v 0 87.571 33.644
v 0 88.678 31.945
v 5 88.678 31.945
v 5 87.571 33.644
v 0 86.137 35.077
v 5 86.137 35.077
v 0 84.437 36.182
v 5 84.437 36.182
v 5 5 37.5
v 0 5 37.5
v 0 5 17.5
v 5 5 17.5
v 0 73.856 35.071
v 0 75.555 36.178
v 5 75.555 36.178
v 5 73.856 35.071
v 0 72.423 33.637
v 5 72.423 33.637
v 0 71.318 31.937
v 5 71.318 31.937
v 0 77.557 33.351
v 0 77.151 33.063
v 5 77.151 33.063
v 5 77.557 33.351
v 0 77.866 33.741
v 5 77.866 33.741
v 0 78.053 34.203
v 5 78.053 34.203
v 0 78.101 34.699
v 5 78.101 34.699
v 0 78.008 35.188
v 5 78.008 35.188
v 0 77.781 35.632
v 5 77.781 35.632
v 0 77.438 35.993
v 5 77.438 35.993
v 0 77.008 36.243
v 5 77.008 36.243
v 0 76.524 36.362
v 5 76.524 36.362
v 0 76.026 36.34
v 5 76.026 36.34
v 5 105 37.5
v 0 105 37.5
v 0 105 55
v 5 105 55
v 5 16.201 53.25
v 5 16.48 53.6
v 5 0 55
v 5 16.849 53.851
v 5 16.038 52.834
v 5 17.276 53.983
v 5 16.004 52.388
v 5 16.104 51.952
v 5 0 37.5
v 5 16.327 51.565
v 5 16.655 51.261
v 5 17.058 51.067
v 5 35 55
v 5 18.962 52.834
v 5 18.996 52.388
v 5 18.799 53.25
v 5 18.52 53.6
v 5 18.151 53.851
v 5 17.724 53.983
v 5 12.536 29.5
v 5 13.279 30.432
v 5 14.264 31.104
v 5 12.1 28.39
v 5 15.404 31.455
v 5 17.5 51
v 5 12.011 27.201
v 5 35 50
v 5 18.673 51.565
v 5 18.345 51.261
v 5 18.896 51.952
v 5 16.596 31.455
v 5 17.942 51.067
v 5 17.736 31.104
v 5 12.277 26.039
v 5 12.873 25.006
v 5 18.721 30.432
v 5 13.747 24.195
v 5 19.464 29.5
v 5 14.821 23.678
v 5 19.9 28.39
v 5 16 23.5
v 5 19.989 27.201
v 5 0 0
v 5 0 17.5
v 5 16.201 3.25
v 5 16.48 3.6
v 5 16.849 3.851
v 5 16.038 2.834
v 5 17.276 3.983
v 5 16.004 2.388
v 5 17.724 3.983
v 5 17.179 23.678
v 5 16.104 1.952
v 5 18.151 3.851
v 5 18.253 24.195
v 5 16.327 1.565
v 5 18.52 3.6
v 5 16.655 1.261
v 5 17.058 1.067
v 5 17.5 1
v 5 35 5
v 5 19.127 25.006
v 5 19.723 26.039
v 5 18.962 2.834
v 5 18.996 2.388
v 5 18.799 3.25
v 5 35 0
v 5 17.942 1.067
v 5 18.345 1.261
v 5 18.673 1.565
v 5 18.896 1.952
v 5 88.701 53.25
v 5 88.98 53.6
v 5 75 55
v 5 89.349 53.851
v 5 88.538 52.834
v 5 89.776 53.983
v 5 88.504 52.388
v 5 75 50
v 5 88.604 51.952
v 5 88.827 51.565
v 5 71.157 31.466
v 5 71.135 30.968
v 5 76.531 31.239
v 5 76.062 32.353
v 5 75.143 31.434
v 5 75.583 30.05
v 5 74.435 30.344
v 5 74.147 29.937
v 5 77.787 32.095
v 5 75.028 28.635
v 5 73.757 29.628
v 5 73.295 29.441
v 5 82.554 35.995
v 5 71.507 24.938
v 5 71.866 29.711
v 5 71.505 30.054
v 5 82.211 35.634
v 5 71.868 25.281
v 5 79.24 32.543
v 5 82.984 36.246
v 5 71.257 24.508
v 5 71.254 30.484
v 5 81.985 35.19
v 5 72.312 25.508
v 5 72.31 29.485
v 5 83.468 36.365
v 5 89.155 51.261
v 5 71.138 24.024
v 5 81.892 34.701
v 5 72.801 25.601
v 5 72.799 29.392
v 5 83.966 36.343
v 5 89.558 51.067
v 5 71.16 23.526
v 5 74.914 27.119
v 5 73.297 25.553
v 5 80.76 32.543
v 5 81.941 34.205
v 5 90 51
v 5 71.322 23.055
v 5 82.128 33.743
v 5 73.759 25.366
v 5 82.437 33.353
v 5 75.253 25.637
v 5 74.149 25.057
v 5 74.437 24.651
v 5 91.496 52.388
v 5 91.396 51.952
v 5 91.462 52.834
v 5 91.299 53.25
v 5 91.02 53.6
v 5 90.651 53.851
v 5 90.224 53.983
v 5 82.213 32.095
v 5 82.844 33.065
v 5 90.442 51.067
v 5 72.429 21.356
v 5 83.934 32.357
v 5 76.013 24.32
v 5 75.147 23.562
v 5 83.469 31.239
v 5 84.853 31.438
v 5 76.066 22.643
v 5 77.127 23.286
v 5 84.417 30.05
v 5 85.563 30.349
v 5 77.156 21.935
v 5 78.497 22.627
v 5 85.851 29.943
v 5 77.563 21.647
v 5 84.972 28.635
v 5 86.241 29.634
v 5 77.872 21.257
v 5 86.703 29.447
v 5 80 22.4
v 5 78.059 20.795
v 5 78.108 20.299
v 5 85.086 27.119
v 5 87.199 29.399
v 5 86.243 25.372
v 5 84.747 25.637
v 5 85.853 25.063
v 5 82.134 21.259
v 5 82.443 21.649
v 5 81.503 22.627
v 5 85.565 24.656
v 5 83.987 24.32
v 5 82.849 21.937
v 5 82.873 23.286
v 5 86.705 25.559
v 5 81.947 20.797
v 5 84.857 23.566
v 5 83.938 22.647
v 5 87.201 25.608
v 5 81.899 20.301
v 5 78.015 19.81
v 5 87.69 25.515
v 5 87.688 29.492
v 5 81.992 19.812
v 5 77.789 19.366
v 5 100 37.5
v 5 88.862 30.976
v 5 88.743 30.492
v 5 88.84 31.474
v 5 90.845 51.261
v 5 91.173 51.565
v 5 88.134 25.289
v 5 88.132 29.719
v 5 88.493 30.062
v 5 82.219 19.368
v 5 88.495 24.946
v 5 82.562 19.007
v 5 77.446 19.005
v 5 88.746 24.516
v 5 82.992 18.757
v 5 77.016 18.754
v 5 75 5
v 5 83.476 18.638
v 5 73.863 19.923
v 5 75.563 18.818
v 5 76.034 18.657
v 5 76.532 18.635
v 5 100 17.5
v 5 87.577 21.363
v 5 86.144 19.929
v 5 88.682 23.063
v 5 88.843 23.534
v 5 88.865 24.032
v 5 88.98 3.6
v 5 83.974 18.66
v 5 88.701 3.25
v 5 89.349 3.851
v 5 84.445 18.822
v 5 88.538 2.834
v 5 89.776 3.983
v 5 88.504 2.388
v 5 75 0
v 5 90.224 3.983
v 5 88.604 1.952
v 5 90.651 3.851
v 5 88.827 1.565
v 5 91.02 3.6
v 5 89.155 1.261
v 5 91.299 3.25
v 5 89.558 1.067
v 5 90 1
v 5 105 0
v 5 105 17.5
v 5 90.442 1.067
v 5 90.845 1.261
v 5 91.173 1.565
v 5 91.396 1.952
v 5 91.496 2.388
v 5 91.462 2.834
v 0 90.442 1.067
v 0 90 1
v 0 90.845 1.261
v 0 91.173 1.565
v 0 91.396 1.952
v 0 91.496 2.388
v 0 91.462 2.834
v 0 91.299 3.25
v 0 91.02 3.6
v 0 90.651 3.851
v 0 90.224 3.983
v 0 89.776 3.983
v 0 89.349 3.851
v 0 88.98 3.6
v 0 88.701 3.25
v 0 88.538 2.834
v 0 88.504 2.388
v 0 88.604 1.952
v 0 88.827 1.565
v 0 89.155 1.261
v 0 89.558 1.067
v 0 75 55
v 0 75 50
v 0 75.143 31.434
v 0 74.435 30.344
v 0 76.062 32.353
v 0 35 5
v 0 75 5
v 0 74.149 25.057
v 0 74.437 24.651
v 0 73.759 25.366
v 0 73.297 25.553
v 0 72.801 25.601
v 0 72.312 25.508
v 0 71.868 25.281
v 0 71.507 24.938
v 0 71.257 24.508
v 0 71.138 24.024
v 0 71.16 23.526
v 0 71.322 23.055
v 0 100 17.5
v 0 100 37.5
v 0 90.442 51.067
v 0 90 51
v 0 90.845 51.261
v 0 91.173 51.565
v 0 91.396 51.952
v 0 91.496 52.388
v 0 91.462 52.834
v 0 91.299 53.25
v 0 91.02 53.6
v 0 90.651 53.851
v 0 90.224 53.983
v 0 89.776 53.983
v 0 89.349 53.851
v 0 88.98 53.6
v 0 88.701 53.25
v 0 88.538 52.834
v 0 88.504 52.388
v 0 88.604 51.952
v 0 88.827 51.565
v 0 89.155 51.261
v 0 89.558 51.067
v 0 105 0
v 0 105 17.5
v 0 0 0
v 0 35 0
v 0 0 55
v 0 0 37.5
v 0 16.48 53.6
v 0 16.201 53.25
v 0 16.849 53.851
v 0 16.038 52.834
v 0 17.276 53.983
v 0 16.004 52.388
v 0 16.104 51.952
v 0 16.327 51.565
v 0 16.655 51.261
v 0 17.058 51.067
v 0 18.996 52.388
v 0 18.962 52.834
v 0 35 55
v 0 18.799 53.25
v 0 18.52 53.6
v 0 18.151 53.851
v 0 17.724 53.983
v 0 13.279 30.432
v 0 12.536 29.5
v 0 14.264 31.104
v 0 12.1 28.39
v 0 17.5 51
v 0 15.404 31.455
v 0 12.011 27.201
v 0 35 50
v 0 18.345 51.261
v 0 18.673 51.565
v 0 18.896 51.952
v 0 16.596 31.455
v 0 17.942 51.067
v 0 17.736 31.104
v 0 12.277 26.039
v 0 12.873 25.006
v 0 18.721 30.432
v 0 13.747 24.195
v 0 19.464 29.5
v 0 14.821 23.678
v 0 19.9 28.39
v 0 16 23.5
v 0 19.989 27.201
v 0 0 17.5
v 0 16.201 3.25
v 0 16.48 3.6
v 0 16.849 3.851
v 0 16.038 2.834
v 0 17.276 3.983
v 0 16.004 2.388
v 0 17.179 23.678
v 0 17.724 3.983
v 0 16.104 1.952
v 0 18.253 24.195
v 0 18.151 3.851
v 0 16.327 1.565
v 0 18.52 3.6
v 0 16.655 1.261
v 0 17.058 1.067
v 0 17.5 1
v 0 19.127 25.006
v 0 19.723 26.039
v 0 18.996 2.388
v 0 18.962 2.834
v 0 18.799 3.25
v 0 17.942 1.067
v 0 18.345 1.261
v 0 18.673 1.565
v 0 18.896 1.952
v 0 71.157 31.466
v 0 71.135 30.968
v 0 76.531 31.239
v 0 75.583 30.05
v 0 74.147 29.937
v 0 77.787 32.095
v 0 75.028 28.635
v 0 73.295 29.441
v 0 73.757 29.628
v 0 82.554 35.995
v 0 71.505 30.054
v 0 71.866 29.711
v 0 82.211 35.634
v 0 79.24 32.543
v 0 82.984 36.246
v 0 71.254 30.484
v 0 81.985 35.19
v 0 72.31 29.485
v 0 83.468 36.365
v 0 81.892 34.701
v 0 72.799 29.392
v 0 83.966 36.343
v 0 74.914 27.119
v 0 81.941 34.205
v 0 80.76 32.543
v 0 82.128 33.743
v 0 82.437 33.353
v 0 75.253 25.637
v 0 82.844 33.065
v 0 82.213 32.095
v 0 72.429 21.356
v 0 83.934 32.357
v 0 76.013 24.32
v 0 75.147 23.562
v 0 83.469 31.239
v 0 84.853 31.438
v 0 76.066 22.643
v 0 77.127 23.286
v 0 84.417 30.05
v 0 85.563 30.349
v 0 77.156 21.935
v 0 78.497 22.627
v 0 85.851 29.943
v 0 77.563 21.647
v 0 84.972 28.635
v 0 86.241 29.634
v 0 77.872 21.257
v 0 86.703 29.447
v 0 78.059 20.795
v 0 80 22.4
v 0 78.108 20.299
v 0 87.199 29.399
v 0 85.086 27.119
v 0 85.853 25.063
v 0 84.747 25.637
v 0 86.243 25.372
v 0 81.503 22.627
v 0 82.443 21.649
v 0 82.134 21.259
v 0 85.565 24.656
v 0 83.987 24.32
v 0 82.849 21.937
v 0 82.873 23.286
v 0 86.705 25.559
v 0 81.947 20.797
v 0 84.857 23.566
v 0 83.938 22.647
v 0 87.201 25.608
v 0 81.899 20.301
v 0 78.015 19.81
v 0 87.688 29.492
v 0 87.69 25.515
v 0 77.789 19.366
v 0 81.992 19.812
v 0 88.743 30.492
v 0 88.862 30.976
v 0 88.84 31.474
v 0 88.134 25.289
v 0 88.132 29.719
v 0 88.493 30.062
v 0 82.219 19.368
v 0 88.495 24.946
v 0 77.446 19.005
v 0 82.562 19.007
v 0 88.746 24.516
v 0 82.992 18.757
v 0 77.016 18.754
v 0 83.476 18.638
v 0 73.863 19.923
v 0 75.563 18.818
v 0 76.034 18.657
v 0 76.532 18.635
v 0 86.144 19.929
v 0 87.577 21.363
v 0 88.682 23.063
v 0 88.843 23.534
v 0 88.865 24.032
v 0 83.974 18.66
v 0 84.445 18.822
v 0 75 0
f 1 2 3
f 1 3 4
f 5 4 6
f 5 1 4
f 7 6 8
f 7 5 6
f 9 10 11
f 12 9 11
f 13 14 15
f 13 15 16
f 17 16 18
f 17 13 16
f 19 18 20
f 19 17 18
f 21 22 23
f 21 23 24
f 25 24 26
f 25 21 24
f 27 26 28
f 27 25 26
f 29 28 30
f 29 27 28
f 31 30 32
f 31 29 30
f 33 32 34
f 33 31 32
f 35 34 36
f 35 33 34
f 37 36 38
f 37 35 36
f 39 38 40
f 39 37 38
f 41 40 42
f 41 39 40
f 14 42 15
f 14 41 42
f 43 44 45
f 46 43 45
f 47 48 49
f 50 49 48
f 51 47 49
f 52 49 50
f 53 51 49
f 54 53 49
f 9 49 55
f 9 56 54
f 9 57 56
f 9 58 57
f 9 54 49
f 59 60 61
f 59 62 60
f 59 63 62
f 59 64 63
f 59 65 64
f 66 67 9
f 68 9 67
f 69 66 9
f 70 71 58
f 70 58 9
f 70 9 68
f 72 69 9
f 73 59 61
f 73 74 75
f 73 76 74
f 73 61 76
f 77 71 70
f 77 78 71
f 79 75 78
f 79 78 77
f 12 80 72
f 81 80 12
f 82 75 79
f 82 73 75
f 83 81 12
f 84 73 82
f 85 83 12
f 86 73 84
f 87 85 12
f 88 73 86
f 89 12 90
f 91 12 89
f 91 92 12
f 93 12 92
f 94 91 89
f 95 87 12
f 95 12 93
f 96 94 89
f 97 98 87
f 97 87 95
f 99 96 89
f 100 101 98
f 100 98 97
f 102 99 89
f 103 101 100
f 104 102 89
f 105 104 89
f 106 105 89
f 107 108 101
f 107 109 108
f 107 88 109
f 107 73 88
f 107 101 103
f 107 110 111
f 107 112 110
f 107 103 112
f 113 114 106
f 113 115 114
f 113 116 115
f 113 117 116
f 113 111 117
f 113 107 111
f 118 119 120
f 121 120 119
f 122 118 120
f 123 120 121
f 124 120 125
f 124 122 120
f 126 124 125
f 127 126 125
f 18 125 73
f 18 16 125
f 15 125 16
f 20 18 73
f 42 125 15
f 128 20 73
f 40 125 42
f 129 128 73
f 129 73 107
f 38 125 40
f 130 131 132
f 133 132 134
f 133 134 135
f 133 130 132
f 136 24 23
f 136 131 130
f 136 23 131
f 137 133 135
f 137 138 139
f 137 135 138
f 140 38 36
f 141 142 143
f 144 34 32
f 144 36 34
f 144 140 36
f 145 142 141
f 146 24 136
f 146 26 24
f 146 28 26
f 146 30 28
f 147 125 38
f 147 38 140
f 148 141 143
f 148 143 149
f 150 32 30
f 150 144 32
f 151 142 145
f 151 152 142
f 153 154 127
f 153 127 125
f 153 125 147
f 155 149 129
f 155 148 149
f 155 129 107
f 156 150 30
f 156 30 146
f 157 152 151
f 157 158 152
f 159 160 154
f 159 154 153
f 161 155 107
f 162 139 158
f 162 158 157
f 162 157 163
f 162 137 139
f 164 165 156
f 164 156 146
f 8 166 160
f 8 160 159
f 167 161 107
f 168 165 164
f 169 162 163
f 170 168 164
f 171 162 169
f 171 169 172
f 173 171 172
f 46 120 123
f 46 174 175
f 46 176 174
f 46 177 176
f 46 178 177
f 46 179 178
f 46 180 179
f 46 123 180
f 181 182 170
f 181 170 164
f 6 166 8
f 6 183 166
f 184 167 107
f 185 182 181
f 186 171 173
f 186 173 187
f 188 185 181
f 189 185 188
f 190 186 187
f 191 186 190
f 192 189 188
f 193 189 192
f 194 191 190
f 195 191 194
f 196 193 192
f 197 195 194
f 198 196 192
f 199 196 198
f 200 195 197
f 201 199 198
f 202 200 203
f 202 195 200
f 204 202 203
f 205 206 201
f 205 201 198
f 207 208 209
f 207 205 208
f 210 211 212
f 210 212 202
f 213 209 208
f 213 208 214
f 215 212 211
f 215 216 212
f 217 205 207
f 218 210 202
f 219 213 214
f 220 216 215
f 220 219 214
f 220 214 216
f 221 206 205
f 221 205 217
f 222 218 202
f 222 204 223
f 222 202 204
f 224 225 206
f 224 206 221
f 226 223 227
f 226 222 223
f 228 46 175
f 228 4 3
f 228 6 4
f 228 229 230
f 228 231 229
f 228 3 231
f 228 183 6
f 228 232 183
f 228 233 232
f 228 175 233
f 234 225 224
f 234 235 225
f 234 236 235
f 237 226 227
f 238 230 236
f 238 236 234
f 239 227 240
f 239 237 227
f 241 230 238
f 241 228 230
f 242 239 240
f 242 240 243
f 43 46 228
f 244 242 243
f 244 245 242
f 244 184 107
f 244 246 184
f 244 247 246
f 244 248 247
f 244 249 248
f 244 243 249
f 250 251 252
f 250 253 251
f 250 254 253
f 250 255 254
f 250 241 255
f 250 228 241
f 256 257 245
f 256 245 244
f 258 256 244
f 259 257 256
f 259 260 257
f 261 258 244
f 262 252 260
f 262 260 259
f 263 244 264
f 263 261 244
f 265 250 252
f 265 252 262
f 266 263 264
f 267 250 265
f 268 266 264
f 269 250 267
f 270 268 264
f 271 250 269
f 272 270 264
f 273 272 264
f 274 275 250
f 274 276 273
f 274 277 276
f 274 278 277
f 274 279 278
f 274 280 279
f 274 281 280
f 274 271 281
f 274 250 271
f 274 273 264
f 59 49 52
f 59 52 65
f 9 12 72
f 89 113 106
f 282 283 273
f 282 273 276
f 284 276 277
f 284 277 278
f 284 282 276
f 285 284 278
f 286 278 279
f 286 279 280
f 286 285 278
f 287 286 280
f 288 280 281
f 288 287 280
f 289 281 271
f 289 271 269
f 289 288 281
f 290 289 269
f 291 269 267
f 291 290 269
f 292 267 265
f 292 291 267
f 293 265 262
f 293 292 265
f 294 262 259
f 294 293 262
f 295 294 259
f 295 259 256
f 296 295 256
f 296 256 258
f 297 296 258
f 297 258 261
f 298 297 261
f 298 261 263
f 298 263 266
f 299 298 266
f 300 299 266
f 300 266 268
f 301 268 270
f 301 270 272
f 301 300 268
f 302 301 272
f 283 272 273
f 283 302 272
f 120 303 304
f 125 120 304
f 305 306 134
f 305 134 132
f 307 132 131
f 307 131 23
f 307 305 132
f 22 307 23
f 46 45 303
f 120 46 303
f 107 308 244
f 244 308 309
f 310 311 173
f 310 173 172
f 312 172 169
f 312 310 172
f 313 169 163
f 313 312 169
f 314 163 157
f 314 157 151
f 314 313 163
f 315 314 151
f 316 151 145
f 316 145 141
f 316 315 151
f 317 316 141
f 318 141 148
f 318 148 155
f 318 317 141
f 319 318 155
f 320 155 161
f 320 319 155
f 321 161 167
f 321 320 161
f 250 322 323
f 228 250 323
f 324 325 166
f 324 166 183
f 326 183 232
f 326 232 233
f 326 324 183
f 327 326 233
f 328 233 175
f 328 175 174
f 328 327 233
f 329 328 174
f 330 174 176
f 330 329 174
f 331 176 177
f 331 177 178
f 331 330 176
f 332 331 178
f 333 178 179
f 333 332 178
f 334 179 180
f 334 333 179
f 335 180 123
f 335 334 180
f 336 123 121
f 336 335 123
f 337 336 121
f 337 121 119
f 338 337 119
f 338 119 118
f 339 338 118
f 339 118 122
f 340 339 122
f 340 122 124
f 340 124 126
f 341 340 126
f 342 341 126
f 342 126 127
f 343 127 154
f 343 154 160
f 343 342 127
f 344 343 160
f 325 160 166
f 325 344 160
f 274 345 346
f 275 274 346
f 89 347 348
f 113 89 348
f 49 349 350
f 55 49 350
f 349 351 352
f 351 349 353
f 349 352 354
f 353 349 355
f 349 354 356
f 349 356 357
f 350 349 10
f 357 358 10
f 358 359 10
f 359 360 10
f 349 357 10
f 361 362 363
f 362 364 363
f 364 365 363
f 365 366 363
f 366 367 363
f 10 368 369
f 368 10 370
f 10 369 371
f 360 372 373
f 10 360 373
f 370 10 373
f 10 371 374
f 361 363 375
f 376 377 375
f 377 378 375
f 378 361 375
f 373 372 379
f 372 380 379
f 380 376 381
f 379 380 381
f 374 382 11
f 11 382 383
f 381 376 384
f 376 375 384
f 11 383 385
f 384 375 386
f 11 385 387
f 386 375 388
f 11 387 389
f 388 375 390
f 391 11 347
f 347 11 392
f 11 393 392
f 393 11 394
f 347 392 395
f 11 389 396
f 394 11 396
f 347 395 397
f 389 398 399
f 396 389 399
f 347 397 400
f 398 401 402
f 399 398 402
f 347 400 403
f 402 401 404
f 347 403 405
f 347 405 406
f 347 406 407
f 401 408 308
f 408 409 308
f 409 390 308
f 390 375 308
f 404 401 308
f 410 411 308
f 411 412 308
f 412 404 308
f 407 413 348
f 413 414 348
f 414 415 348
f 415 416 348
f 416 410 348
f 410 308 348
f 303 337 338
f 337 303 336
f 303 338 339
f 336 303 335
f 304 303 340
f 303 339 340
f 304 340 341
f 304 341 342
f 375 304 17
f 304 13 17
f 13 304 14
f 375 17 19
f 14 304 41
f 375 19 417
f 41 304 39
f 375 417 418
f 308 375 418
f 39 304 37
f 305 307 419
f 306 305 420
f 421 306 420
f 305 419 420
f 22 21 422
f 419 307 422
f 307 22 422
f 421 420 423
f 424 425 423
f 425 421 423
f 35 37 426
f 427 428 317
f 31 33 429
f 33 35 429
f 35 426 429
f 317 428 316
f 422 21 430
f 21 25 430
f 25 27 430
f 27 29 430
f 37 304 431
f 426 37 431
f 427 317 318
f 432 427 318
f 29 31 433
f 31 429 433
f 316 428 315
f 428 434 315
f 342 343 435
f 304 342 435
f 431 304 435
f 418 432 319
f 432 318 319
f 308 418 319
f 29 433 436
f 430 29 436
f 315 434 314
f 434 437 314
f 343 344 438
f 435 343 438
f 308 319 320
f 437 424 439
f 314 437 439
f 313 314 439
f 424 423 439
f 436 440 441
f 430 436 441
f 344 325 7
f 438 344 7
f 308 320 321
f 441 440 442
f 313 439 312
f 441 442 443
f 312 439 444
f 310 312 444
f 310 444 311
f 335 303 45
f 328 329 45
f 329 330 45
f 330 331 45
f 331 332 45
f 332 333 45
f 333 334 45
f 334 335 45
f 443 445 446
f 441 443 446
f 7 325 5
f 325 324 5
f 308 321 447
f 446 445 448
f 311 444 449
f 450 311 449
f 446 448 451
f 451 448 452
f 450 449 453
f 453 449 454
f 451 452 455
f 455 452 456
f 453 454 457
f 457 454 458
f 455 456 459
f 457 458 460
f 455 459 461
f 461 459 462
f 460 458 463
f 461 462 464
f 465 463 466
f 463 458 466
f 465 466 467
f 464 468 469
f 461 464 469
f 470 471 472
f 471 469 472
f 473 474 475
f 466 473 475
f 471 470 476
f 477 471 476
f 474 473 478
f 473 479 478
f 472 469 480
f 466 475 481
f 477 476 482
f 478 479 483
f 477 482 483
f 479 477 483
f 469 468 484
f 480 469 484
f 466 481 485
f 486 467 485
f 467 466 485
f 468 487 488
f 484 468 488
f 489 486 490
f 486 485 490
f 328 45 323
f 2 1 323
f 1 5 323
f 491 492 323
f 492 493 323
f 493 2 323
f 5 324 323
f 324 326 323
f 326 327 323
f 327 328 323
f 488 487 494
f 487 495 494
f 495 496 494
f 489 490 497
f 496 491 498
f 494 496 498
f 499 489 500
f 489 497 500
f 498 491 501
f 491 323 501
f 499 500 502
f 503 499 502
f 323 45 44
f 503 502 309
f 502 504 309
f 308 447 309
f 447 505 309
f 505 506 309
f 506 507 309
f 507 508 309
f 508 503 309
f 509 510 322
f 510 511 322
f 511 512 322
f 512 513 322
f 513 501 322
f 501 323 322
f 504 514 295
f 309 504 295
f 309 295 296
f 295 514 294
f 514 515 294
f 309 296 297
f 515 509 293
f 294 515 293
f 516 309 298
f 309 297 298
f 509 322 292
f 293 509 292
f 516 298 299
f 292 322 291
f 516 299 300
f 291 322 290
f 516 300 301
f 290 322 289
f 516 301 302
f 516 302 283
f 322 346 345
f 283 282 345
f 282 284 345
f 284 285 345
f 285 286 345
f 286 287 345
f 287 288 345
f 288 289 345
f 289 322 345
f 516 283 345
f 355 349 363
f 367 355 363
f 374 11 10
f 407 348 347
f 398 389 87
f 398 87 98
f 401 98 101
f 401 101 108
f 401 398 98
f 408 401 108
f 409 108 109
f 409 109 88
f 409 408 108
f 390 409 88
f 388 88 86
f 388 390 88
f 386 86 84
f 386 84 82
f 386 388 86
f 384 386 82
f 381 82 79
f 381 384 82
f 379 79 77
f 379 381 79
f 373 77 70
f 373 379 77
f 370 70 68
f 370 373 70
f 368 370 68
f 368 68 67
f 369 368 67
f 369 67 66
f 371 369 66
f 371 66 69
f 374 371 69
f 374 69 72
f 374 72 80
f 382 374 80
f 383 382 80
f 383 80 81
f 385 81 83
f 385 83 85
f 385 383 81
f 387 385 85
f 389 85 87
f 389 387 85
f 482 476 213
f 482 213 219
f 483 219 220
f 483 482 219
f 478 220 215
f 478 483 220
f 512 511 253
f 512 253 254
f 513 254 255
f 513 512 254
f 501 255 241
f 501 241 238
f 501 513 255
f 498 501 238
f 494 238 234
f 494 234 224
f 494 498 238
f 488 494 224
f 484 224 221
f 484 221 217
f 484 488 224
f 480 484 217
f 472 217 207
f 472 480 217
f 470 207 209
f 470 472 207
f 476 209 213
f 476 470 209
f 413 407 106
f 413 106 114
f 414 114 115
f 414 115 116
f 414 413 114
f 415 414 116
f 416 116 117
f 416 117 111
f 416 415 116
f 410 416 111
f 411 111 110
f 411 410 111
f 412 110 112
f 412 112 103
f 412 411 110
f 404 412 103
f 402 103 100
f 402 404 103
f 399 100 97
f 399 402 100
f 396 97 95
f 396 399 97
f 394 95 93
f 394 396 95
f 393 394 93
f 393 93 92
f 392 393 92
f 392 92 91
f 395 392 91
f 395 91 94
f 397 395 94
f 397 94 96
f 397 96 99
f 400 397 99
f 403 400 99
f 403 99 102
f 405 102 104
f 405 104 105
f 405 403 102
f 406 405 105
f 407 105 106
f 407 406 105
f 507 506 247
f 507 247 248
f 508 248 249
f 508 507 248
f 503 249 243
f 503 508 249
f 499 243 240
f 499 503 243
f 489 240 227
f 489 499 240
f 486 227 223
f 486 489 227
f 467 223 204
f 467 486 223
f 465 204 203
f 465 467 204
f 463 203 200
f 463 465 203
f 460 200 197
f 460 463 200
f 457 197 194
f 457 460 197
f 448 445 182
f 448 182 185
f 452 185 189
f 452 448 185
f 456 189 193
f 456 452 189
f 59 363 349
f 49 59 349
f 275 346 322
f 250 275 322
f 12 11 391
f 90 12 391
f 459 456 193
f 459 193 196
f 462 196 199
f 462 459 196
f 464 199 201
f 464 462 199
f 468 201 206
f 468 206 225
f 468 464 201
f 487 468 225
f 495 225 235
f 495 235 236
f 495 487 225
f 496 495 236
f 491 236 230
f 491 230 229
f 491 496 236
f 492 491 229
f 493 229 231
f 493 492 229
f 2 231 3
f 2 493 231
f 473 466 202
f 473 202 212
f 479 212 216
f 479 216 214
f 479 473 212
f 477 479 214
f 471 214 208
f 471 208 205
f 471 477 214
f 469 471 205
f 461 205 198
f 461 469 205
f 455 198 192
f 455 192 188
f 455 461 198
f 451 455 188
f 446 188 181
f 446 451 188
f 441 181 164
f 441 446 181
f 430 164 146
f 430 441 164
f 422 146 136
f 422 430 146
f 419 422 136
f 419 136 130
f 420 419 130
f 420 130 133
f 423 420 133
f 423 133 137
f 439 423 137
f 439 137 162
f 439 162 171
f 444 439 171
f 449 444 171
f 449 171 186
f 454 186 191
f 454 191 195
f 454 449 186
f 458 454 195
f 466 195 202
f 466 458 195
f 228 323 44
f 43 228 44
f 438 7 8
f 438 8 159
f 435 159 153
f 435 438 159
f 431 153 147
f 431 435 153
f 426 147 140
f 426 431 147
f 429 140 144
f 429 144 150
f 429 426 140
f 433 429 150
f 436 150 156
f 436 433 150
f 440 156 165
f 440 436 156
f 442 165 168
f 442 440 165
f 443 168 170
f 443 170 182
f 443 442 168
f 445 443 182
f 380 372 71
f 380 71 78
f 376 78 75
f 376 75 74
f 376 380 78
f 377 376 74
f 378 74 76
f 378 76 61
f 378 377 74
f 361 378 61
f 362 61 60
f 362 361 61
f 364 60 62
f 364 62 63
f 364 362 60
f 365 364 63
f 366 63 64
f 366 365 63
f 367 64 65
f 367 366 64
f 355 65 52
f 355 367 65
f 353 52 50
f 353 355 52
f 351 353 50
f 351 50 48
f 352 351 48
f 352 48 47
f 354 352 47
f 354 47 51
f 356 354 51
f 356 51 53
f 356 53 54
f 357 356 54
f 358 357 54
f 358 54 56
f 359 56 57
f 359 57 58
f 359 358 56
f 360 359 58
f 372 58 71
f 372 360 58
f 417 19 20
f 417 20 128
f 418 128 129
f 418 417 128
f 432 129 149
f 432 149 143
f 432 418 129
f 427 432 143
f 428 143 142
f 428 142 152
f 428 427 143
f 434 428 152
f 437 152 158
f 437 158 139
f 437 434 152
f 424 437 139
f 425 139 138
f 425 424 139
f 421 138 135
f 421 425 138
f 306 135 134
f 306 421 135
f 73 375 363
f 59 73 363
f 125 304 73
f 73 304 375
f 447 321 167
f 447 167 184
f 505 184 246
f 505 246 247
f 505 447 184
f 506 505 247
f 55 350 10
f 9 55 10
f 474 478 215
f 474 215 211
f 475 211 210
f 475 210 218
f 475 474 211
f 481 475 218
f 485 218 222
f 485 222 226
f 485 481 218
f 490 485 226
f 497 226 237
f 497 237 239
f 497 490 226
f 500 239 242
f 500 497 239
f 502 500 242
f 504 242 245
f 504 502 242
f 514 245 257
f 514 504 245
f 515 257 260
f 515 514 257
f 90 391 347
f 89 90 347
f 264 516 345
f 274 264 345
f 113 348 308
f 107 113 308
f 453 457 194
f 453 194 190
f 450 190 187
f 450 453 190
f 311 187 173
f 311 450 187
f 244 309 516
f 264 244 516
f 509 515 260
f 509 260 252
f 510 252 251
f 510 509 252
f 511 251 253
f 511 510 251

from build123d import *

# Parameters (mm, degrees)
SKETCH_1_R      = 4
SKETCH_1_R_2    = 5.1
SKETCH_1_R_3    = 1.5
EXTRUDE_1_DEPTH = 5


with BuildPart() as part:
    # 草图1 → 凸台-拉伸1 (new body)
    with BuildSketch(Plane(origin=(0, 0, 0), x_dir=(0, 0, -1), z_dir=(1, 0, 0))):
        Polygon((-37.5, 105), (-55, 105), (-55, 75), (-50, 75), (-50, 35), (-55, 35), (-55, 0), (-37.5, 0), (-37.5, 5), (-17.5, 5), (-17.5, 0), (0, 0), (0, 35), (-5, 35), (-5, 75), (0, 75), (0, 105), (-17.5, 105), (-17.5, 100), (-37.5, 100), align=None)
        with Locations((-27.5, 16)):
            Circle(SKETCH_1_R, mode=Mode.SUBTRACT)
        with Locations((-27.5, 80)):
            Circle(SKETCH_1_R_2, mode=Mode.SUBTRACT)
        with Locations((-2.5, 90)):
            Circle(SKETCH_1_R_3, mode=Mode.SUBTRACT)
        with Locations((-52.5, 90)):
            Circle(SKETCH_1_R_3, mode=Mode.SUBTRACT)
        with Locations((-52.5, 17.5)):
            Circle(SKETCH_1_R_3, mode=Mode.SUBTRACT)
        with Locations((-2.5, 17.5)):
            Circle(SKETCH_1_R_3, mode=Mode.SUBTRACT)
        with BuildLine():
            ThreePointArc((-31.944781032, 88.677927263), (-34.397440233, 86.891140561), (-36.181985067, 84.436849703))
            ThreePointArc((-36.181985067, 84.436849703), (-35.420037694, 82.082187052), (-33.065375043, 82.844134425))
            ThreePointArc((-33.065375043, 82.844134425), (-31.921436047, 84.417397795), (-30.34921861, 85.562773886))
            ThreePointArc((-30.34921861, 85.562773886), (-29.589423133, 87.918131785), (-31.944781032, 88.677927263))
        make_face(mode=Mode.SUBTRACT)
        with BuildLine():
            ThreePointArc((-18.822072737, 84.444781032), (-20.608859439, 86.897440233), (-23.063150297, 88.681985067))
            ThreePointArc((-23.063150297, 88.681985067), (-25.417812948, 87.920037694), (-24.655865575, 85.565375043))
            ThreePointArc((-24.655865575, 85.565375043), (-23.082602205, 84.421436047), (-21.937226114, 82.84921861))
            ThreePointArc((-21.937226114, 82.84921861), (-19.581868215, 82.089423133), (-18.822072737, 84.444781032))
        make_face(mode=Mode.SUBTRACT)
        with BuildLine():
            ThreePointArc((-23.055218968, 71.322072737), (-20.602559767, 73.108859439), (-18.818014933, 75.563150297))
            ThreePointArc((-18.818014933, 75.563150297), (-19.579962306, 77.917812948), (-21.934624957, 77.155865575))
            ThreePointArc((-21.934624957, 77.155865575), (-23.078563953, 75.582602205), (-24.65078139, 74.437226114))
            ThreePointArc((-24.65078139, 74.437226114), (-25.410576867, 72.081868215), (-23.055218968, 71.322072737))
        make_face(mode=Mode.SUBTRACT)
        with BuildLine():
            ThreePointArc((-36.177927263, 75.555218968), (-34.391140561, 73.102559767), (-31.936849703, 71.318014933))
            ThreePointArc((-31.936849703, 71.318014933), (-29.582187052, 72.079962306), (-30.344134425, 74.434624957))
            ThreePointArc((-30.344134425, 74.434624957), (-31.917397795, 75.578563953), (-33.062773886, 77.15078139))
            ThreePointArc((-33.062773886, 77.15078139), (-35.418131785, 77.910576867), (-36.177927263, 75.555218968))
        make_face(mode=Mode.SUBTRACT)
    extrude(amount=EXTRUDE_1_DEPTH)


solid = part.part
